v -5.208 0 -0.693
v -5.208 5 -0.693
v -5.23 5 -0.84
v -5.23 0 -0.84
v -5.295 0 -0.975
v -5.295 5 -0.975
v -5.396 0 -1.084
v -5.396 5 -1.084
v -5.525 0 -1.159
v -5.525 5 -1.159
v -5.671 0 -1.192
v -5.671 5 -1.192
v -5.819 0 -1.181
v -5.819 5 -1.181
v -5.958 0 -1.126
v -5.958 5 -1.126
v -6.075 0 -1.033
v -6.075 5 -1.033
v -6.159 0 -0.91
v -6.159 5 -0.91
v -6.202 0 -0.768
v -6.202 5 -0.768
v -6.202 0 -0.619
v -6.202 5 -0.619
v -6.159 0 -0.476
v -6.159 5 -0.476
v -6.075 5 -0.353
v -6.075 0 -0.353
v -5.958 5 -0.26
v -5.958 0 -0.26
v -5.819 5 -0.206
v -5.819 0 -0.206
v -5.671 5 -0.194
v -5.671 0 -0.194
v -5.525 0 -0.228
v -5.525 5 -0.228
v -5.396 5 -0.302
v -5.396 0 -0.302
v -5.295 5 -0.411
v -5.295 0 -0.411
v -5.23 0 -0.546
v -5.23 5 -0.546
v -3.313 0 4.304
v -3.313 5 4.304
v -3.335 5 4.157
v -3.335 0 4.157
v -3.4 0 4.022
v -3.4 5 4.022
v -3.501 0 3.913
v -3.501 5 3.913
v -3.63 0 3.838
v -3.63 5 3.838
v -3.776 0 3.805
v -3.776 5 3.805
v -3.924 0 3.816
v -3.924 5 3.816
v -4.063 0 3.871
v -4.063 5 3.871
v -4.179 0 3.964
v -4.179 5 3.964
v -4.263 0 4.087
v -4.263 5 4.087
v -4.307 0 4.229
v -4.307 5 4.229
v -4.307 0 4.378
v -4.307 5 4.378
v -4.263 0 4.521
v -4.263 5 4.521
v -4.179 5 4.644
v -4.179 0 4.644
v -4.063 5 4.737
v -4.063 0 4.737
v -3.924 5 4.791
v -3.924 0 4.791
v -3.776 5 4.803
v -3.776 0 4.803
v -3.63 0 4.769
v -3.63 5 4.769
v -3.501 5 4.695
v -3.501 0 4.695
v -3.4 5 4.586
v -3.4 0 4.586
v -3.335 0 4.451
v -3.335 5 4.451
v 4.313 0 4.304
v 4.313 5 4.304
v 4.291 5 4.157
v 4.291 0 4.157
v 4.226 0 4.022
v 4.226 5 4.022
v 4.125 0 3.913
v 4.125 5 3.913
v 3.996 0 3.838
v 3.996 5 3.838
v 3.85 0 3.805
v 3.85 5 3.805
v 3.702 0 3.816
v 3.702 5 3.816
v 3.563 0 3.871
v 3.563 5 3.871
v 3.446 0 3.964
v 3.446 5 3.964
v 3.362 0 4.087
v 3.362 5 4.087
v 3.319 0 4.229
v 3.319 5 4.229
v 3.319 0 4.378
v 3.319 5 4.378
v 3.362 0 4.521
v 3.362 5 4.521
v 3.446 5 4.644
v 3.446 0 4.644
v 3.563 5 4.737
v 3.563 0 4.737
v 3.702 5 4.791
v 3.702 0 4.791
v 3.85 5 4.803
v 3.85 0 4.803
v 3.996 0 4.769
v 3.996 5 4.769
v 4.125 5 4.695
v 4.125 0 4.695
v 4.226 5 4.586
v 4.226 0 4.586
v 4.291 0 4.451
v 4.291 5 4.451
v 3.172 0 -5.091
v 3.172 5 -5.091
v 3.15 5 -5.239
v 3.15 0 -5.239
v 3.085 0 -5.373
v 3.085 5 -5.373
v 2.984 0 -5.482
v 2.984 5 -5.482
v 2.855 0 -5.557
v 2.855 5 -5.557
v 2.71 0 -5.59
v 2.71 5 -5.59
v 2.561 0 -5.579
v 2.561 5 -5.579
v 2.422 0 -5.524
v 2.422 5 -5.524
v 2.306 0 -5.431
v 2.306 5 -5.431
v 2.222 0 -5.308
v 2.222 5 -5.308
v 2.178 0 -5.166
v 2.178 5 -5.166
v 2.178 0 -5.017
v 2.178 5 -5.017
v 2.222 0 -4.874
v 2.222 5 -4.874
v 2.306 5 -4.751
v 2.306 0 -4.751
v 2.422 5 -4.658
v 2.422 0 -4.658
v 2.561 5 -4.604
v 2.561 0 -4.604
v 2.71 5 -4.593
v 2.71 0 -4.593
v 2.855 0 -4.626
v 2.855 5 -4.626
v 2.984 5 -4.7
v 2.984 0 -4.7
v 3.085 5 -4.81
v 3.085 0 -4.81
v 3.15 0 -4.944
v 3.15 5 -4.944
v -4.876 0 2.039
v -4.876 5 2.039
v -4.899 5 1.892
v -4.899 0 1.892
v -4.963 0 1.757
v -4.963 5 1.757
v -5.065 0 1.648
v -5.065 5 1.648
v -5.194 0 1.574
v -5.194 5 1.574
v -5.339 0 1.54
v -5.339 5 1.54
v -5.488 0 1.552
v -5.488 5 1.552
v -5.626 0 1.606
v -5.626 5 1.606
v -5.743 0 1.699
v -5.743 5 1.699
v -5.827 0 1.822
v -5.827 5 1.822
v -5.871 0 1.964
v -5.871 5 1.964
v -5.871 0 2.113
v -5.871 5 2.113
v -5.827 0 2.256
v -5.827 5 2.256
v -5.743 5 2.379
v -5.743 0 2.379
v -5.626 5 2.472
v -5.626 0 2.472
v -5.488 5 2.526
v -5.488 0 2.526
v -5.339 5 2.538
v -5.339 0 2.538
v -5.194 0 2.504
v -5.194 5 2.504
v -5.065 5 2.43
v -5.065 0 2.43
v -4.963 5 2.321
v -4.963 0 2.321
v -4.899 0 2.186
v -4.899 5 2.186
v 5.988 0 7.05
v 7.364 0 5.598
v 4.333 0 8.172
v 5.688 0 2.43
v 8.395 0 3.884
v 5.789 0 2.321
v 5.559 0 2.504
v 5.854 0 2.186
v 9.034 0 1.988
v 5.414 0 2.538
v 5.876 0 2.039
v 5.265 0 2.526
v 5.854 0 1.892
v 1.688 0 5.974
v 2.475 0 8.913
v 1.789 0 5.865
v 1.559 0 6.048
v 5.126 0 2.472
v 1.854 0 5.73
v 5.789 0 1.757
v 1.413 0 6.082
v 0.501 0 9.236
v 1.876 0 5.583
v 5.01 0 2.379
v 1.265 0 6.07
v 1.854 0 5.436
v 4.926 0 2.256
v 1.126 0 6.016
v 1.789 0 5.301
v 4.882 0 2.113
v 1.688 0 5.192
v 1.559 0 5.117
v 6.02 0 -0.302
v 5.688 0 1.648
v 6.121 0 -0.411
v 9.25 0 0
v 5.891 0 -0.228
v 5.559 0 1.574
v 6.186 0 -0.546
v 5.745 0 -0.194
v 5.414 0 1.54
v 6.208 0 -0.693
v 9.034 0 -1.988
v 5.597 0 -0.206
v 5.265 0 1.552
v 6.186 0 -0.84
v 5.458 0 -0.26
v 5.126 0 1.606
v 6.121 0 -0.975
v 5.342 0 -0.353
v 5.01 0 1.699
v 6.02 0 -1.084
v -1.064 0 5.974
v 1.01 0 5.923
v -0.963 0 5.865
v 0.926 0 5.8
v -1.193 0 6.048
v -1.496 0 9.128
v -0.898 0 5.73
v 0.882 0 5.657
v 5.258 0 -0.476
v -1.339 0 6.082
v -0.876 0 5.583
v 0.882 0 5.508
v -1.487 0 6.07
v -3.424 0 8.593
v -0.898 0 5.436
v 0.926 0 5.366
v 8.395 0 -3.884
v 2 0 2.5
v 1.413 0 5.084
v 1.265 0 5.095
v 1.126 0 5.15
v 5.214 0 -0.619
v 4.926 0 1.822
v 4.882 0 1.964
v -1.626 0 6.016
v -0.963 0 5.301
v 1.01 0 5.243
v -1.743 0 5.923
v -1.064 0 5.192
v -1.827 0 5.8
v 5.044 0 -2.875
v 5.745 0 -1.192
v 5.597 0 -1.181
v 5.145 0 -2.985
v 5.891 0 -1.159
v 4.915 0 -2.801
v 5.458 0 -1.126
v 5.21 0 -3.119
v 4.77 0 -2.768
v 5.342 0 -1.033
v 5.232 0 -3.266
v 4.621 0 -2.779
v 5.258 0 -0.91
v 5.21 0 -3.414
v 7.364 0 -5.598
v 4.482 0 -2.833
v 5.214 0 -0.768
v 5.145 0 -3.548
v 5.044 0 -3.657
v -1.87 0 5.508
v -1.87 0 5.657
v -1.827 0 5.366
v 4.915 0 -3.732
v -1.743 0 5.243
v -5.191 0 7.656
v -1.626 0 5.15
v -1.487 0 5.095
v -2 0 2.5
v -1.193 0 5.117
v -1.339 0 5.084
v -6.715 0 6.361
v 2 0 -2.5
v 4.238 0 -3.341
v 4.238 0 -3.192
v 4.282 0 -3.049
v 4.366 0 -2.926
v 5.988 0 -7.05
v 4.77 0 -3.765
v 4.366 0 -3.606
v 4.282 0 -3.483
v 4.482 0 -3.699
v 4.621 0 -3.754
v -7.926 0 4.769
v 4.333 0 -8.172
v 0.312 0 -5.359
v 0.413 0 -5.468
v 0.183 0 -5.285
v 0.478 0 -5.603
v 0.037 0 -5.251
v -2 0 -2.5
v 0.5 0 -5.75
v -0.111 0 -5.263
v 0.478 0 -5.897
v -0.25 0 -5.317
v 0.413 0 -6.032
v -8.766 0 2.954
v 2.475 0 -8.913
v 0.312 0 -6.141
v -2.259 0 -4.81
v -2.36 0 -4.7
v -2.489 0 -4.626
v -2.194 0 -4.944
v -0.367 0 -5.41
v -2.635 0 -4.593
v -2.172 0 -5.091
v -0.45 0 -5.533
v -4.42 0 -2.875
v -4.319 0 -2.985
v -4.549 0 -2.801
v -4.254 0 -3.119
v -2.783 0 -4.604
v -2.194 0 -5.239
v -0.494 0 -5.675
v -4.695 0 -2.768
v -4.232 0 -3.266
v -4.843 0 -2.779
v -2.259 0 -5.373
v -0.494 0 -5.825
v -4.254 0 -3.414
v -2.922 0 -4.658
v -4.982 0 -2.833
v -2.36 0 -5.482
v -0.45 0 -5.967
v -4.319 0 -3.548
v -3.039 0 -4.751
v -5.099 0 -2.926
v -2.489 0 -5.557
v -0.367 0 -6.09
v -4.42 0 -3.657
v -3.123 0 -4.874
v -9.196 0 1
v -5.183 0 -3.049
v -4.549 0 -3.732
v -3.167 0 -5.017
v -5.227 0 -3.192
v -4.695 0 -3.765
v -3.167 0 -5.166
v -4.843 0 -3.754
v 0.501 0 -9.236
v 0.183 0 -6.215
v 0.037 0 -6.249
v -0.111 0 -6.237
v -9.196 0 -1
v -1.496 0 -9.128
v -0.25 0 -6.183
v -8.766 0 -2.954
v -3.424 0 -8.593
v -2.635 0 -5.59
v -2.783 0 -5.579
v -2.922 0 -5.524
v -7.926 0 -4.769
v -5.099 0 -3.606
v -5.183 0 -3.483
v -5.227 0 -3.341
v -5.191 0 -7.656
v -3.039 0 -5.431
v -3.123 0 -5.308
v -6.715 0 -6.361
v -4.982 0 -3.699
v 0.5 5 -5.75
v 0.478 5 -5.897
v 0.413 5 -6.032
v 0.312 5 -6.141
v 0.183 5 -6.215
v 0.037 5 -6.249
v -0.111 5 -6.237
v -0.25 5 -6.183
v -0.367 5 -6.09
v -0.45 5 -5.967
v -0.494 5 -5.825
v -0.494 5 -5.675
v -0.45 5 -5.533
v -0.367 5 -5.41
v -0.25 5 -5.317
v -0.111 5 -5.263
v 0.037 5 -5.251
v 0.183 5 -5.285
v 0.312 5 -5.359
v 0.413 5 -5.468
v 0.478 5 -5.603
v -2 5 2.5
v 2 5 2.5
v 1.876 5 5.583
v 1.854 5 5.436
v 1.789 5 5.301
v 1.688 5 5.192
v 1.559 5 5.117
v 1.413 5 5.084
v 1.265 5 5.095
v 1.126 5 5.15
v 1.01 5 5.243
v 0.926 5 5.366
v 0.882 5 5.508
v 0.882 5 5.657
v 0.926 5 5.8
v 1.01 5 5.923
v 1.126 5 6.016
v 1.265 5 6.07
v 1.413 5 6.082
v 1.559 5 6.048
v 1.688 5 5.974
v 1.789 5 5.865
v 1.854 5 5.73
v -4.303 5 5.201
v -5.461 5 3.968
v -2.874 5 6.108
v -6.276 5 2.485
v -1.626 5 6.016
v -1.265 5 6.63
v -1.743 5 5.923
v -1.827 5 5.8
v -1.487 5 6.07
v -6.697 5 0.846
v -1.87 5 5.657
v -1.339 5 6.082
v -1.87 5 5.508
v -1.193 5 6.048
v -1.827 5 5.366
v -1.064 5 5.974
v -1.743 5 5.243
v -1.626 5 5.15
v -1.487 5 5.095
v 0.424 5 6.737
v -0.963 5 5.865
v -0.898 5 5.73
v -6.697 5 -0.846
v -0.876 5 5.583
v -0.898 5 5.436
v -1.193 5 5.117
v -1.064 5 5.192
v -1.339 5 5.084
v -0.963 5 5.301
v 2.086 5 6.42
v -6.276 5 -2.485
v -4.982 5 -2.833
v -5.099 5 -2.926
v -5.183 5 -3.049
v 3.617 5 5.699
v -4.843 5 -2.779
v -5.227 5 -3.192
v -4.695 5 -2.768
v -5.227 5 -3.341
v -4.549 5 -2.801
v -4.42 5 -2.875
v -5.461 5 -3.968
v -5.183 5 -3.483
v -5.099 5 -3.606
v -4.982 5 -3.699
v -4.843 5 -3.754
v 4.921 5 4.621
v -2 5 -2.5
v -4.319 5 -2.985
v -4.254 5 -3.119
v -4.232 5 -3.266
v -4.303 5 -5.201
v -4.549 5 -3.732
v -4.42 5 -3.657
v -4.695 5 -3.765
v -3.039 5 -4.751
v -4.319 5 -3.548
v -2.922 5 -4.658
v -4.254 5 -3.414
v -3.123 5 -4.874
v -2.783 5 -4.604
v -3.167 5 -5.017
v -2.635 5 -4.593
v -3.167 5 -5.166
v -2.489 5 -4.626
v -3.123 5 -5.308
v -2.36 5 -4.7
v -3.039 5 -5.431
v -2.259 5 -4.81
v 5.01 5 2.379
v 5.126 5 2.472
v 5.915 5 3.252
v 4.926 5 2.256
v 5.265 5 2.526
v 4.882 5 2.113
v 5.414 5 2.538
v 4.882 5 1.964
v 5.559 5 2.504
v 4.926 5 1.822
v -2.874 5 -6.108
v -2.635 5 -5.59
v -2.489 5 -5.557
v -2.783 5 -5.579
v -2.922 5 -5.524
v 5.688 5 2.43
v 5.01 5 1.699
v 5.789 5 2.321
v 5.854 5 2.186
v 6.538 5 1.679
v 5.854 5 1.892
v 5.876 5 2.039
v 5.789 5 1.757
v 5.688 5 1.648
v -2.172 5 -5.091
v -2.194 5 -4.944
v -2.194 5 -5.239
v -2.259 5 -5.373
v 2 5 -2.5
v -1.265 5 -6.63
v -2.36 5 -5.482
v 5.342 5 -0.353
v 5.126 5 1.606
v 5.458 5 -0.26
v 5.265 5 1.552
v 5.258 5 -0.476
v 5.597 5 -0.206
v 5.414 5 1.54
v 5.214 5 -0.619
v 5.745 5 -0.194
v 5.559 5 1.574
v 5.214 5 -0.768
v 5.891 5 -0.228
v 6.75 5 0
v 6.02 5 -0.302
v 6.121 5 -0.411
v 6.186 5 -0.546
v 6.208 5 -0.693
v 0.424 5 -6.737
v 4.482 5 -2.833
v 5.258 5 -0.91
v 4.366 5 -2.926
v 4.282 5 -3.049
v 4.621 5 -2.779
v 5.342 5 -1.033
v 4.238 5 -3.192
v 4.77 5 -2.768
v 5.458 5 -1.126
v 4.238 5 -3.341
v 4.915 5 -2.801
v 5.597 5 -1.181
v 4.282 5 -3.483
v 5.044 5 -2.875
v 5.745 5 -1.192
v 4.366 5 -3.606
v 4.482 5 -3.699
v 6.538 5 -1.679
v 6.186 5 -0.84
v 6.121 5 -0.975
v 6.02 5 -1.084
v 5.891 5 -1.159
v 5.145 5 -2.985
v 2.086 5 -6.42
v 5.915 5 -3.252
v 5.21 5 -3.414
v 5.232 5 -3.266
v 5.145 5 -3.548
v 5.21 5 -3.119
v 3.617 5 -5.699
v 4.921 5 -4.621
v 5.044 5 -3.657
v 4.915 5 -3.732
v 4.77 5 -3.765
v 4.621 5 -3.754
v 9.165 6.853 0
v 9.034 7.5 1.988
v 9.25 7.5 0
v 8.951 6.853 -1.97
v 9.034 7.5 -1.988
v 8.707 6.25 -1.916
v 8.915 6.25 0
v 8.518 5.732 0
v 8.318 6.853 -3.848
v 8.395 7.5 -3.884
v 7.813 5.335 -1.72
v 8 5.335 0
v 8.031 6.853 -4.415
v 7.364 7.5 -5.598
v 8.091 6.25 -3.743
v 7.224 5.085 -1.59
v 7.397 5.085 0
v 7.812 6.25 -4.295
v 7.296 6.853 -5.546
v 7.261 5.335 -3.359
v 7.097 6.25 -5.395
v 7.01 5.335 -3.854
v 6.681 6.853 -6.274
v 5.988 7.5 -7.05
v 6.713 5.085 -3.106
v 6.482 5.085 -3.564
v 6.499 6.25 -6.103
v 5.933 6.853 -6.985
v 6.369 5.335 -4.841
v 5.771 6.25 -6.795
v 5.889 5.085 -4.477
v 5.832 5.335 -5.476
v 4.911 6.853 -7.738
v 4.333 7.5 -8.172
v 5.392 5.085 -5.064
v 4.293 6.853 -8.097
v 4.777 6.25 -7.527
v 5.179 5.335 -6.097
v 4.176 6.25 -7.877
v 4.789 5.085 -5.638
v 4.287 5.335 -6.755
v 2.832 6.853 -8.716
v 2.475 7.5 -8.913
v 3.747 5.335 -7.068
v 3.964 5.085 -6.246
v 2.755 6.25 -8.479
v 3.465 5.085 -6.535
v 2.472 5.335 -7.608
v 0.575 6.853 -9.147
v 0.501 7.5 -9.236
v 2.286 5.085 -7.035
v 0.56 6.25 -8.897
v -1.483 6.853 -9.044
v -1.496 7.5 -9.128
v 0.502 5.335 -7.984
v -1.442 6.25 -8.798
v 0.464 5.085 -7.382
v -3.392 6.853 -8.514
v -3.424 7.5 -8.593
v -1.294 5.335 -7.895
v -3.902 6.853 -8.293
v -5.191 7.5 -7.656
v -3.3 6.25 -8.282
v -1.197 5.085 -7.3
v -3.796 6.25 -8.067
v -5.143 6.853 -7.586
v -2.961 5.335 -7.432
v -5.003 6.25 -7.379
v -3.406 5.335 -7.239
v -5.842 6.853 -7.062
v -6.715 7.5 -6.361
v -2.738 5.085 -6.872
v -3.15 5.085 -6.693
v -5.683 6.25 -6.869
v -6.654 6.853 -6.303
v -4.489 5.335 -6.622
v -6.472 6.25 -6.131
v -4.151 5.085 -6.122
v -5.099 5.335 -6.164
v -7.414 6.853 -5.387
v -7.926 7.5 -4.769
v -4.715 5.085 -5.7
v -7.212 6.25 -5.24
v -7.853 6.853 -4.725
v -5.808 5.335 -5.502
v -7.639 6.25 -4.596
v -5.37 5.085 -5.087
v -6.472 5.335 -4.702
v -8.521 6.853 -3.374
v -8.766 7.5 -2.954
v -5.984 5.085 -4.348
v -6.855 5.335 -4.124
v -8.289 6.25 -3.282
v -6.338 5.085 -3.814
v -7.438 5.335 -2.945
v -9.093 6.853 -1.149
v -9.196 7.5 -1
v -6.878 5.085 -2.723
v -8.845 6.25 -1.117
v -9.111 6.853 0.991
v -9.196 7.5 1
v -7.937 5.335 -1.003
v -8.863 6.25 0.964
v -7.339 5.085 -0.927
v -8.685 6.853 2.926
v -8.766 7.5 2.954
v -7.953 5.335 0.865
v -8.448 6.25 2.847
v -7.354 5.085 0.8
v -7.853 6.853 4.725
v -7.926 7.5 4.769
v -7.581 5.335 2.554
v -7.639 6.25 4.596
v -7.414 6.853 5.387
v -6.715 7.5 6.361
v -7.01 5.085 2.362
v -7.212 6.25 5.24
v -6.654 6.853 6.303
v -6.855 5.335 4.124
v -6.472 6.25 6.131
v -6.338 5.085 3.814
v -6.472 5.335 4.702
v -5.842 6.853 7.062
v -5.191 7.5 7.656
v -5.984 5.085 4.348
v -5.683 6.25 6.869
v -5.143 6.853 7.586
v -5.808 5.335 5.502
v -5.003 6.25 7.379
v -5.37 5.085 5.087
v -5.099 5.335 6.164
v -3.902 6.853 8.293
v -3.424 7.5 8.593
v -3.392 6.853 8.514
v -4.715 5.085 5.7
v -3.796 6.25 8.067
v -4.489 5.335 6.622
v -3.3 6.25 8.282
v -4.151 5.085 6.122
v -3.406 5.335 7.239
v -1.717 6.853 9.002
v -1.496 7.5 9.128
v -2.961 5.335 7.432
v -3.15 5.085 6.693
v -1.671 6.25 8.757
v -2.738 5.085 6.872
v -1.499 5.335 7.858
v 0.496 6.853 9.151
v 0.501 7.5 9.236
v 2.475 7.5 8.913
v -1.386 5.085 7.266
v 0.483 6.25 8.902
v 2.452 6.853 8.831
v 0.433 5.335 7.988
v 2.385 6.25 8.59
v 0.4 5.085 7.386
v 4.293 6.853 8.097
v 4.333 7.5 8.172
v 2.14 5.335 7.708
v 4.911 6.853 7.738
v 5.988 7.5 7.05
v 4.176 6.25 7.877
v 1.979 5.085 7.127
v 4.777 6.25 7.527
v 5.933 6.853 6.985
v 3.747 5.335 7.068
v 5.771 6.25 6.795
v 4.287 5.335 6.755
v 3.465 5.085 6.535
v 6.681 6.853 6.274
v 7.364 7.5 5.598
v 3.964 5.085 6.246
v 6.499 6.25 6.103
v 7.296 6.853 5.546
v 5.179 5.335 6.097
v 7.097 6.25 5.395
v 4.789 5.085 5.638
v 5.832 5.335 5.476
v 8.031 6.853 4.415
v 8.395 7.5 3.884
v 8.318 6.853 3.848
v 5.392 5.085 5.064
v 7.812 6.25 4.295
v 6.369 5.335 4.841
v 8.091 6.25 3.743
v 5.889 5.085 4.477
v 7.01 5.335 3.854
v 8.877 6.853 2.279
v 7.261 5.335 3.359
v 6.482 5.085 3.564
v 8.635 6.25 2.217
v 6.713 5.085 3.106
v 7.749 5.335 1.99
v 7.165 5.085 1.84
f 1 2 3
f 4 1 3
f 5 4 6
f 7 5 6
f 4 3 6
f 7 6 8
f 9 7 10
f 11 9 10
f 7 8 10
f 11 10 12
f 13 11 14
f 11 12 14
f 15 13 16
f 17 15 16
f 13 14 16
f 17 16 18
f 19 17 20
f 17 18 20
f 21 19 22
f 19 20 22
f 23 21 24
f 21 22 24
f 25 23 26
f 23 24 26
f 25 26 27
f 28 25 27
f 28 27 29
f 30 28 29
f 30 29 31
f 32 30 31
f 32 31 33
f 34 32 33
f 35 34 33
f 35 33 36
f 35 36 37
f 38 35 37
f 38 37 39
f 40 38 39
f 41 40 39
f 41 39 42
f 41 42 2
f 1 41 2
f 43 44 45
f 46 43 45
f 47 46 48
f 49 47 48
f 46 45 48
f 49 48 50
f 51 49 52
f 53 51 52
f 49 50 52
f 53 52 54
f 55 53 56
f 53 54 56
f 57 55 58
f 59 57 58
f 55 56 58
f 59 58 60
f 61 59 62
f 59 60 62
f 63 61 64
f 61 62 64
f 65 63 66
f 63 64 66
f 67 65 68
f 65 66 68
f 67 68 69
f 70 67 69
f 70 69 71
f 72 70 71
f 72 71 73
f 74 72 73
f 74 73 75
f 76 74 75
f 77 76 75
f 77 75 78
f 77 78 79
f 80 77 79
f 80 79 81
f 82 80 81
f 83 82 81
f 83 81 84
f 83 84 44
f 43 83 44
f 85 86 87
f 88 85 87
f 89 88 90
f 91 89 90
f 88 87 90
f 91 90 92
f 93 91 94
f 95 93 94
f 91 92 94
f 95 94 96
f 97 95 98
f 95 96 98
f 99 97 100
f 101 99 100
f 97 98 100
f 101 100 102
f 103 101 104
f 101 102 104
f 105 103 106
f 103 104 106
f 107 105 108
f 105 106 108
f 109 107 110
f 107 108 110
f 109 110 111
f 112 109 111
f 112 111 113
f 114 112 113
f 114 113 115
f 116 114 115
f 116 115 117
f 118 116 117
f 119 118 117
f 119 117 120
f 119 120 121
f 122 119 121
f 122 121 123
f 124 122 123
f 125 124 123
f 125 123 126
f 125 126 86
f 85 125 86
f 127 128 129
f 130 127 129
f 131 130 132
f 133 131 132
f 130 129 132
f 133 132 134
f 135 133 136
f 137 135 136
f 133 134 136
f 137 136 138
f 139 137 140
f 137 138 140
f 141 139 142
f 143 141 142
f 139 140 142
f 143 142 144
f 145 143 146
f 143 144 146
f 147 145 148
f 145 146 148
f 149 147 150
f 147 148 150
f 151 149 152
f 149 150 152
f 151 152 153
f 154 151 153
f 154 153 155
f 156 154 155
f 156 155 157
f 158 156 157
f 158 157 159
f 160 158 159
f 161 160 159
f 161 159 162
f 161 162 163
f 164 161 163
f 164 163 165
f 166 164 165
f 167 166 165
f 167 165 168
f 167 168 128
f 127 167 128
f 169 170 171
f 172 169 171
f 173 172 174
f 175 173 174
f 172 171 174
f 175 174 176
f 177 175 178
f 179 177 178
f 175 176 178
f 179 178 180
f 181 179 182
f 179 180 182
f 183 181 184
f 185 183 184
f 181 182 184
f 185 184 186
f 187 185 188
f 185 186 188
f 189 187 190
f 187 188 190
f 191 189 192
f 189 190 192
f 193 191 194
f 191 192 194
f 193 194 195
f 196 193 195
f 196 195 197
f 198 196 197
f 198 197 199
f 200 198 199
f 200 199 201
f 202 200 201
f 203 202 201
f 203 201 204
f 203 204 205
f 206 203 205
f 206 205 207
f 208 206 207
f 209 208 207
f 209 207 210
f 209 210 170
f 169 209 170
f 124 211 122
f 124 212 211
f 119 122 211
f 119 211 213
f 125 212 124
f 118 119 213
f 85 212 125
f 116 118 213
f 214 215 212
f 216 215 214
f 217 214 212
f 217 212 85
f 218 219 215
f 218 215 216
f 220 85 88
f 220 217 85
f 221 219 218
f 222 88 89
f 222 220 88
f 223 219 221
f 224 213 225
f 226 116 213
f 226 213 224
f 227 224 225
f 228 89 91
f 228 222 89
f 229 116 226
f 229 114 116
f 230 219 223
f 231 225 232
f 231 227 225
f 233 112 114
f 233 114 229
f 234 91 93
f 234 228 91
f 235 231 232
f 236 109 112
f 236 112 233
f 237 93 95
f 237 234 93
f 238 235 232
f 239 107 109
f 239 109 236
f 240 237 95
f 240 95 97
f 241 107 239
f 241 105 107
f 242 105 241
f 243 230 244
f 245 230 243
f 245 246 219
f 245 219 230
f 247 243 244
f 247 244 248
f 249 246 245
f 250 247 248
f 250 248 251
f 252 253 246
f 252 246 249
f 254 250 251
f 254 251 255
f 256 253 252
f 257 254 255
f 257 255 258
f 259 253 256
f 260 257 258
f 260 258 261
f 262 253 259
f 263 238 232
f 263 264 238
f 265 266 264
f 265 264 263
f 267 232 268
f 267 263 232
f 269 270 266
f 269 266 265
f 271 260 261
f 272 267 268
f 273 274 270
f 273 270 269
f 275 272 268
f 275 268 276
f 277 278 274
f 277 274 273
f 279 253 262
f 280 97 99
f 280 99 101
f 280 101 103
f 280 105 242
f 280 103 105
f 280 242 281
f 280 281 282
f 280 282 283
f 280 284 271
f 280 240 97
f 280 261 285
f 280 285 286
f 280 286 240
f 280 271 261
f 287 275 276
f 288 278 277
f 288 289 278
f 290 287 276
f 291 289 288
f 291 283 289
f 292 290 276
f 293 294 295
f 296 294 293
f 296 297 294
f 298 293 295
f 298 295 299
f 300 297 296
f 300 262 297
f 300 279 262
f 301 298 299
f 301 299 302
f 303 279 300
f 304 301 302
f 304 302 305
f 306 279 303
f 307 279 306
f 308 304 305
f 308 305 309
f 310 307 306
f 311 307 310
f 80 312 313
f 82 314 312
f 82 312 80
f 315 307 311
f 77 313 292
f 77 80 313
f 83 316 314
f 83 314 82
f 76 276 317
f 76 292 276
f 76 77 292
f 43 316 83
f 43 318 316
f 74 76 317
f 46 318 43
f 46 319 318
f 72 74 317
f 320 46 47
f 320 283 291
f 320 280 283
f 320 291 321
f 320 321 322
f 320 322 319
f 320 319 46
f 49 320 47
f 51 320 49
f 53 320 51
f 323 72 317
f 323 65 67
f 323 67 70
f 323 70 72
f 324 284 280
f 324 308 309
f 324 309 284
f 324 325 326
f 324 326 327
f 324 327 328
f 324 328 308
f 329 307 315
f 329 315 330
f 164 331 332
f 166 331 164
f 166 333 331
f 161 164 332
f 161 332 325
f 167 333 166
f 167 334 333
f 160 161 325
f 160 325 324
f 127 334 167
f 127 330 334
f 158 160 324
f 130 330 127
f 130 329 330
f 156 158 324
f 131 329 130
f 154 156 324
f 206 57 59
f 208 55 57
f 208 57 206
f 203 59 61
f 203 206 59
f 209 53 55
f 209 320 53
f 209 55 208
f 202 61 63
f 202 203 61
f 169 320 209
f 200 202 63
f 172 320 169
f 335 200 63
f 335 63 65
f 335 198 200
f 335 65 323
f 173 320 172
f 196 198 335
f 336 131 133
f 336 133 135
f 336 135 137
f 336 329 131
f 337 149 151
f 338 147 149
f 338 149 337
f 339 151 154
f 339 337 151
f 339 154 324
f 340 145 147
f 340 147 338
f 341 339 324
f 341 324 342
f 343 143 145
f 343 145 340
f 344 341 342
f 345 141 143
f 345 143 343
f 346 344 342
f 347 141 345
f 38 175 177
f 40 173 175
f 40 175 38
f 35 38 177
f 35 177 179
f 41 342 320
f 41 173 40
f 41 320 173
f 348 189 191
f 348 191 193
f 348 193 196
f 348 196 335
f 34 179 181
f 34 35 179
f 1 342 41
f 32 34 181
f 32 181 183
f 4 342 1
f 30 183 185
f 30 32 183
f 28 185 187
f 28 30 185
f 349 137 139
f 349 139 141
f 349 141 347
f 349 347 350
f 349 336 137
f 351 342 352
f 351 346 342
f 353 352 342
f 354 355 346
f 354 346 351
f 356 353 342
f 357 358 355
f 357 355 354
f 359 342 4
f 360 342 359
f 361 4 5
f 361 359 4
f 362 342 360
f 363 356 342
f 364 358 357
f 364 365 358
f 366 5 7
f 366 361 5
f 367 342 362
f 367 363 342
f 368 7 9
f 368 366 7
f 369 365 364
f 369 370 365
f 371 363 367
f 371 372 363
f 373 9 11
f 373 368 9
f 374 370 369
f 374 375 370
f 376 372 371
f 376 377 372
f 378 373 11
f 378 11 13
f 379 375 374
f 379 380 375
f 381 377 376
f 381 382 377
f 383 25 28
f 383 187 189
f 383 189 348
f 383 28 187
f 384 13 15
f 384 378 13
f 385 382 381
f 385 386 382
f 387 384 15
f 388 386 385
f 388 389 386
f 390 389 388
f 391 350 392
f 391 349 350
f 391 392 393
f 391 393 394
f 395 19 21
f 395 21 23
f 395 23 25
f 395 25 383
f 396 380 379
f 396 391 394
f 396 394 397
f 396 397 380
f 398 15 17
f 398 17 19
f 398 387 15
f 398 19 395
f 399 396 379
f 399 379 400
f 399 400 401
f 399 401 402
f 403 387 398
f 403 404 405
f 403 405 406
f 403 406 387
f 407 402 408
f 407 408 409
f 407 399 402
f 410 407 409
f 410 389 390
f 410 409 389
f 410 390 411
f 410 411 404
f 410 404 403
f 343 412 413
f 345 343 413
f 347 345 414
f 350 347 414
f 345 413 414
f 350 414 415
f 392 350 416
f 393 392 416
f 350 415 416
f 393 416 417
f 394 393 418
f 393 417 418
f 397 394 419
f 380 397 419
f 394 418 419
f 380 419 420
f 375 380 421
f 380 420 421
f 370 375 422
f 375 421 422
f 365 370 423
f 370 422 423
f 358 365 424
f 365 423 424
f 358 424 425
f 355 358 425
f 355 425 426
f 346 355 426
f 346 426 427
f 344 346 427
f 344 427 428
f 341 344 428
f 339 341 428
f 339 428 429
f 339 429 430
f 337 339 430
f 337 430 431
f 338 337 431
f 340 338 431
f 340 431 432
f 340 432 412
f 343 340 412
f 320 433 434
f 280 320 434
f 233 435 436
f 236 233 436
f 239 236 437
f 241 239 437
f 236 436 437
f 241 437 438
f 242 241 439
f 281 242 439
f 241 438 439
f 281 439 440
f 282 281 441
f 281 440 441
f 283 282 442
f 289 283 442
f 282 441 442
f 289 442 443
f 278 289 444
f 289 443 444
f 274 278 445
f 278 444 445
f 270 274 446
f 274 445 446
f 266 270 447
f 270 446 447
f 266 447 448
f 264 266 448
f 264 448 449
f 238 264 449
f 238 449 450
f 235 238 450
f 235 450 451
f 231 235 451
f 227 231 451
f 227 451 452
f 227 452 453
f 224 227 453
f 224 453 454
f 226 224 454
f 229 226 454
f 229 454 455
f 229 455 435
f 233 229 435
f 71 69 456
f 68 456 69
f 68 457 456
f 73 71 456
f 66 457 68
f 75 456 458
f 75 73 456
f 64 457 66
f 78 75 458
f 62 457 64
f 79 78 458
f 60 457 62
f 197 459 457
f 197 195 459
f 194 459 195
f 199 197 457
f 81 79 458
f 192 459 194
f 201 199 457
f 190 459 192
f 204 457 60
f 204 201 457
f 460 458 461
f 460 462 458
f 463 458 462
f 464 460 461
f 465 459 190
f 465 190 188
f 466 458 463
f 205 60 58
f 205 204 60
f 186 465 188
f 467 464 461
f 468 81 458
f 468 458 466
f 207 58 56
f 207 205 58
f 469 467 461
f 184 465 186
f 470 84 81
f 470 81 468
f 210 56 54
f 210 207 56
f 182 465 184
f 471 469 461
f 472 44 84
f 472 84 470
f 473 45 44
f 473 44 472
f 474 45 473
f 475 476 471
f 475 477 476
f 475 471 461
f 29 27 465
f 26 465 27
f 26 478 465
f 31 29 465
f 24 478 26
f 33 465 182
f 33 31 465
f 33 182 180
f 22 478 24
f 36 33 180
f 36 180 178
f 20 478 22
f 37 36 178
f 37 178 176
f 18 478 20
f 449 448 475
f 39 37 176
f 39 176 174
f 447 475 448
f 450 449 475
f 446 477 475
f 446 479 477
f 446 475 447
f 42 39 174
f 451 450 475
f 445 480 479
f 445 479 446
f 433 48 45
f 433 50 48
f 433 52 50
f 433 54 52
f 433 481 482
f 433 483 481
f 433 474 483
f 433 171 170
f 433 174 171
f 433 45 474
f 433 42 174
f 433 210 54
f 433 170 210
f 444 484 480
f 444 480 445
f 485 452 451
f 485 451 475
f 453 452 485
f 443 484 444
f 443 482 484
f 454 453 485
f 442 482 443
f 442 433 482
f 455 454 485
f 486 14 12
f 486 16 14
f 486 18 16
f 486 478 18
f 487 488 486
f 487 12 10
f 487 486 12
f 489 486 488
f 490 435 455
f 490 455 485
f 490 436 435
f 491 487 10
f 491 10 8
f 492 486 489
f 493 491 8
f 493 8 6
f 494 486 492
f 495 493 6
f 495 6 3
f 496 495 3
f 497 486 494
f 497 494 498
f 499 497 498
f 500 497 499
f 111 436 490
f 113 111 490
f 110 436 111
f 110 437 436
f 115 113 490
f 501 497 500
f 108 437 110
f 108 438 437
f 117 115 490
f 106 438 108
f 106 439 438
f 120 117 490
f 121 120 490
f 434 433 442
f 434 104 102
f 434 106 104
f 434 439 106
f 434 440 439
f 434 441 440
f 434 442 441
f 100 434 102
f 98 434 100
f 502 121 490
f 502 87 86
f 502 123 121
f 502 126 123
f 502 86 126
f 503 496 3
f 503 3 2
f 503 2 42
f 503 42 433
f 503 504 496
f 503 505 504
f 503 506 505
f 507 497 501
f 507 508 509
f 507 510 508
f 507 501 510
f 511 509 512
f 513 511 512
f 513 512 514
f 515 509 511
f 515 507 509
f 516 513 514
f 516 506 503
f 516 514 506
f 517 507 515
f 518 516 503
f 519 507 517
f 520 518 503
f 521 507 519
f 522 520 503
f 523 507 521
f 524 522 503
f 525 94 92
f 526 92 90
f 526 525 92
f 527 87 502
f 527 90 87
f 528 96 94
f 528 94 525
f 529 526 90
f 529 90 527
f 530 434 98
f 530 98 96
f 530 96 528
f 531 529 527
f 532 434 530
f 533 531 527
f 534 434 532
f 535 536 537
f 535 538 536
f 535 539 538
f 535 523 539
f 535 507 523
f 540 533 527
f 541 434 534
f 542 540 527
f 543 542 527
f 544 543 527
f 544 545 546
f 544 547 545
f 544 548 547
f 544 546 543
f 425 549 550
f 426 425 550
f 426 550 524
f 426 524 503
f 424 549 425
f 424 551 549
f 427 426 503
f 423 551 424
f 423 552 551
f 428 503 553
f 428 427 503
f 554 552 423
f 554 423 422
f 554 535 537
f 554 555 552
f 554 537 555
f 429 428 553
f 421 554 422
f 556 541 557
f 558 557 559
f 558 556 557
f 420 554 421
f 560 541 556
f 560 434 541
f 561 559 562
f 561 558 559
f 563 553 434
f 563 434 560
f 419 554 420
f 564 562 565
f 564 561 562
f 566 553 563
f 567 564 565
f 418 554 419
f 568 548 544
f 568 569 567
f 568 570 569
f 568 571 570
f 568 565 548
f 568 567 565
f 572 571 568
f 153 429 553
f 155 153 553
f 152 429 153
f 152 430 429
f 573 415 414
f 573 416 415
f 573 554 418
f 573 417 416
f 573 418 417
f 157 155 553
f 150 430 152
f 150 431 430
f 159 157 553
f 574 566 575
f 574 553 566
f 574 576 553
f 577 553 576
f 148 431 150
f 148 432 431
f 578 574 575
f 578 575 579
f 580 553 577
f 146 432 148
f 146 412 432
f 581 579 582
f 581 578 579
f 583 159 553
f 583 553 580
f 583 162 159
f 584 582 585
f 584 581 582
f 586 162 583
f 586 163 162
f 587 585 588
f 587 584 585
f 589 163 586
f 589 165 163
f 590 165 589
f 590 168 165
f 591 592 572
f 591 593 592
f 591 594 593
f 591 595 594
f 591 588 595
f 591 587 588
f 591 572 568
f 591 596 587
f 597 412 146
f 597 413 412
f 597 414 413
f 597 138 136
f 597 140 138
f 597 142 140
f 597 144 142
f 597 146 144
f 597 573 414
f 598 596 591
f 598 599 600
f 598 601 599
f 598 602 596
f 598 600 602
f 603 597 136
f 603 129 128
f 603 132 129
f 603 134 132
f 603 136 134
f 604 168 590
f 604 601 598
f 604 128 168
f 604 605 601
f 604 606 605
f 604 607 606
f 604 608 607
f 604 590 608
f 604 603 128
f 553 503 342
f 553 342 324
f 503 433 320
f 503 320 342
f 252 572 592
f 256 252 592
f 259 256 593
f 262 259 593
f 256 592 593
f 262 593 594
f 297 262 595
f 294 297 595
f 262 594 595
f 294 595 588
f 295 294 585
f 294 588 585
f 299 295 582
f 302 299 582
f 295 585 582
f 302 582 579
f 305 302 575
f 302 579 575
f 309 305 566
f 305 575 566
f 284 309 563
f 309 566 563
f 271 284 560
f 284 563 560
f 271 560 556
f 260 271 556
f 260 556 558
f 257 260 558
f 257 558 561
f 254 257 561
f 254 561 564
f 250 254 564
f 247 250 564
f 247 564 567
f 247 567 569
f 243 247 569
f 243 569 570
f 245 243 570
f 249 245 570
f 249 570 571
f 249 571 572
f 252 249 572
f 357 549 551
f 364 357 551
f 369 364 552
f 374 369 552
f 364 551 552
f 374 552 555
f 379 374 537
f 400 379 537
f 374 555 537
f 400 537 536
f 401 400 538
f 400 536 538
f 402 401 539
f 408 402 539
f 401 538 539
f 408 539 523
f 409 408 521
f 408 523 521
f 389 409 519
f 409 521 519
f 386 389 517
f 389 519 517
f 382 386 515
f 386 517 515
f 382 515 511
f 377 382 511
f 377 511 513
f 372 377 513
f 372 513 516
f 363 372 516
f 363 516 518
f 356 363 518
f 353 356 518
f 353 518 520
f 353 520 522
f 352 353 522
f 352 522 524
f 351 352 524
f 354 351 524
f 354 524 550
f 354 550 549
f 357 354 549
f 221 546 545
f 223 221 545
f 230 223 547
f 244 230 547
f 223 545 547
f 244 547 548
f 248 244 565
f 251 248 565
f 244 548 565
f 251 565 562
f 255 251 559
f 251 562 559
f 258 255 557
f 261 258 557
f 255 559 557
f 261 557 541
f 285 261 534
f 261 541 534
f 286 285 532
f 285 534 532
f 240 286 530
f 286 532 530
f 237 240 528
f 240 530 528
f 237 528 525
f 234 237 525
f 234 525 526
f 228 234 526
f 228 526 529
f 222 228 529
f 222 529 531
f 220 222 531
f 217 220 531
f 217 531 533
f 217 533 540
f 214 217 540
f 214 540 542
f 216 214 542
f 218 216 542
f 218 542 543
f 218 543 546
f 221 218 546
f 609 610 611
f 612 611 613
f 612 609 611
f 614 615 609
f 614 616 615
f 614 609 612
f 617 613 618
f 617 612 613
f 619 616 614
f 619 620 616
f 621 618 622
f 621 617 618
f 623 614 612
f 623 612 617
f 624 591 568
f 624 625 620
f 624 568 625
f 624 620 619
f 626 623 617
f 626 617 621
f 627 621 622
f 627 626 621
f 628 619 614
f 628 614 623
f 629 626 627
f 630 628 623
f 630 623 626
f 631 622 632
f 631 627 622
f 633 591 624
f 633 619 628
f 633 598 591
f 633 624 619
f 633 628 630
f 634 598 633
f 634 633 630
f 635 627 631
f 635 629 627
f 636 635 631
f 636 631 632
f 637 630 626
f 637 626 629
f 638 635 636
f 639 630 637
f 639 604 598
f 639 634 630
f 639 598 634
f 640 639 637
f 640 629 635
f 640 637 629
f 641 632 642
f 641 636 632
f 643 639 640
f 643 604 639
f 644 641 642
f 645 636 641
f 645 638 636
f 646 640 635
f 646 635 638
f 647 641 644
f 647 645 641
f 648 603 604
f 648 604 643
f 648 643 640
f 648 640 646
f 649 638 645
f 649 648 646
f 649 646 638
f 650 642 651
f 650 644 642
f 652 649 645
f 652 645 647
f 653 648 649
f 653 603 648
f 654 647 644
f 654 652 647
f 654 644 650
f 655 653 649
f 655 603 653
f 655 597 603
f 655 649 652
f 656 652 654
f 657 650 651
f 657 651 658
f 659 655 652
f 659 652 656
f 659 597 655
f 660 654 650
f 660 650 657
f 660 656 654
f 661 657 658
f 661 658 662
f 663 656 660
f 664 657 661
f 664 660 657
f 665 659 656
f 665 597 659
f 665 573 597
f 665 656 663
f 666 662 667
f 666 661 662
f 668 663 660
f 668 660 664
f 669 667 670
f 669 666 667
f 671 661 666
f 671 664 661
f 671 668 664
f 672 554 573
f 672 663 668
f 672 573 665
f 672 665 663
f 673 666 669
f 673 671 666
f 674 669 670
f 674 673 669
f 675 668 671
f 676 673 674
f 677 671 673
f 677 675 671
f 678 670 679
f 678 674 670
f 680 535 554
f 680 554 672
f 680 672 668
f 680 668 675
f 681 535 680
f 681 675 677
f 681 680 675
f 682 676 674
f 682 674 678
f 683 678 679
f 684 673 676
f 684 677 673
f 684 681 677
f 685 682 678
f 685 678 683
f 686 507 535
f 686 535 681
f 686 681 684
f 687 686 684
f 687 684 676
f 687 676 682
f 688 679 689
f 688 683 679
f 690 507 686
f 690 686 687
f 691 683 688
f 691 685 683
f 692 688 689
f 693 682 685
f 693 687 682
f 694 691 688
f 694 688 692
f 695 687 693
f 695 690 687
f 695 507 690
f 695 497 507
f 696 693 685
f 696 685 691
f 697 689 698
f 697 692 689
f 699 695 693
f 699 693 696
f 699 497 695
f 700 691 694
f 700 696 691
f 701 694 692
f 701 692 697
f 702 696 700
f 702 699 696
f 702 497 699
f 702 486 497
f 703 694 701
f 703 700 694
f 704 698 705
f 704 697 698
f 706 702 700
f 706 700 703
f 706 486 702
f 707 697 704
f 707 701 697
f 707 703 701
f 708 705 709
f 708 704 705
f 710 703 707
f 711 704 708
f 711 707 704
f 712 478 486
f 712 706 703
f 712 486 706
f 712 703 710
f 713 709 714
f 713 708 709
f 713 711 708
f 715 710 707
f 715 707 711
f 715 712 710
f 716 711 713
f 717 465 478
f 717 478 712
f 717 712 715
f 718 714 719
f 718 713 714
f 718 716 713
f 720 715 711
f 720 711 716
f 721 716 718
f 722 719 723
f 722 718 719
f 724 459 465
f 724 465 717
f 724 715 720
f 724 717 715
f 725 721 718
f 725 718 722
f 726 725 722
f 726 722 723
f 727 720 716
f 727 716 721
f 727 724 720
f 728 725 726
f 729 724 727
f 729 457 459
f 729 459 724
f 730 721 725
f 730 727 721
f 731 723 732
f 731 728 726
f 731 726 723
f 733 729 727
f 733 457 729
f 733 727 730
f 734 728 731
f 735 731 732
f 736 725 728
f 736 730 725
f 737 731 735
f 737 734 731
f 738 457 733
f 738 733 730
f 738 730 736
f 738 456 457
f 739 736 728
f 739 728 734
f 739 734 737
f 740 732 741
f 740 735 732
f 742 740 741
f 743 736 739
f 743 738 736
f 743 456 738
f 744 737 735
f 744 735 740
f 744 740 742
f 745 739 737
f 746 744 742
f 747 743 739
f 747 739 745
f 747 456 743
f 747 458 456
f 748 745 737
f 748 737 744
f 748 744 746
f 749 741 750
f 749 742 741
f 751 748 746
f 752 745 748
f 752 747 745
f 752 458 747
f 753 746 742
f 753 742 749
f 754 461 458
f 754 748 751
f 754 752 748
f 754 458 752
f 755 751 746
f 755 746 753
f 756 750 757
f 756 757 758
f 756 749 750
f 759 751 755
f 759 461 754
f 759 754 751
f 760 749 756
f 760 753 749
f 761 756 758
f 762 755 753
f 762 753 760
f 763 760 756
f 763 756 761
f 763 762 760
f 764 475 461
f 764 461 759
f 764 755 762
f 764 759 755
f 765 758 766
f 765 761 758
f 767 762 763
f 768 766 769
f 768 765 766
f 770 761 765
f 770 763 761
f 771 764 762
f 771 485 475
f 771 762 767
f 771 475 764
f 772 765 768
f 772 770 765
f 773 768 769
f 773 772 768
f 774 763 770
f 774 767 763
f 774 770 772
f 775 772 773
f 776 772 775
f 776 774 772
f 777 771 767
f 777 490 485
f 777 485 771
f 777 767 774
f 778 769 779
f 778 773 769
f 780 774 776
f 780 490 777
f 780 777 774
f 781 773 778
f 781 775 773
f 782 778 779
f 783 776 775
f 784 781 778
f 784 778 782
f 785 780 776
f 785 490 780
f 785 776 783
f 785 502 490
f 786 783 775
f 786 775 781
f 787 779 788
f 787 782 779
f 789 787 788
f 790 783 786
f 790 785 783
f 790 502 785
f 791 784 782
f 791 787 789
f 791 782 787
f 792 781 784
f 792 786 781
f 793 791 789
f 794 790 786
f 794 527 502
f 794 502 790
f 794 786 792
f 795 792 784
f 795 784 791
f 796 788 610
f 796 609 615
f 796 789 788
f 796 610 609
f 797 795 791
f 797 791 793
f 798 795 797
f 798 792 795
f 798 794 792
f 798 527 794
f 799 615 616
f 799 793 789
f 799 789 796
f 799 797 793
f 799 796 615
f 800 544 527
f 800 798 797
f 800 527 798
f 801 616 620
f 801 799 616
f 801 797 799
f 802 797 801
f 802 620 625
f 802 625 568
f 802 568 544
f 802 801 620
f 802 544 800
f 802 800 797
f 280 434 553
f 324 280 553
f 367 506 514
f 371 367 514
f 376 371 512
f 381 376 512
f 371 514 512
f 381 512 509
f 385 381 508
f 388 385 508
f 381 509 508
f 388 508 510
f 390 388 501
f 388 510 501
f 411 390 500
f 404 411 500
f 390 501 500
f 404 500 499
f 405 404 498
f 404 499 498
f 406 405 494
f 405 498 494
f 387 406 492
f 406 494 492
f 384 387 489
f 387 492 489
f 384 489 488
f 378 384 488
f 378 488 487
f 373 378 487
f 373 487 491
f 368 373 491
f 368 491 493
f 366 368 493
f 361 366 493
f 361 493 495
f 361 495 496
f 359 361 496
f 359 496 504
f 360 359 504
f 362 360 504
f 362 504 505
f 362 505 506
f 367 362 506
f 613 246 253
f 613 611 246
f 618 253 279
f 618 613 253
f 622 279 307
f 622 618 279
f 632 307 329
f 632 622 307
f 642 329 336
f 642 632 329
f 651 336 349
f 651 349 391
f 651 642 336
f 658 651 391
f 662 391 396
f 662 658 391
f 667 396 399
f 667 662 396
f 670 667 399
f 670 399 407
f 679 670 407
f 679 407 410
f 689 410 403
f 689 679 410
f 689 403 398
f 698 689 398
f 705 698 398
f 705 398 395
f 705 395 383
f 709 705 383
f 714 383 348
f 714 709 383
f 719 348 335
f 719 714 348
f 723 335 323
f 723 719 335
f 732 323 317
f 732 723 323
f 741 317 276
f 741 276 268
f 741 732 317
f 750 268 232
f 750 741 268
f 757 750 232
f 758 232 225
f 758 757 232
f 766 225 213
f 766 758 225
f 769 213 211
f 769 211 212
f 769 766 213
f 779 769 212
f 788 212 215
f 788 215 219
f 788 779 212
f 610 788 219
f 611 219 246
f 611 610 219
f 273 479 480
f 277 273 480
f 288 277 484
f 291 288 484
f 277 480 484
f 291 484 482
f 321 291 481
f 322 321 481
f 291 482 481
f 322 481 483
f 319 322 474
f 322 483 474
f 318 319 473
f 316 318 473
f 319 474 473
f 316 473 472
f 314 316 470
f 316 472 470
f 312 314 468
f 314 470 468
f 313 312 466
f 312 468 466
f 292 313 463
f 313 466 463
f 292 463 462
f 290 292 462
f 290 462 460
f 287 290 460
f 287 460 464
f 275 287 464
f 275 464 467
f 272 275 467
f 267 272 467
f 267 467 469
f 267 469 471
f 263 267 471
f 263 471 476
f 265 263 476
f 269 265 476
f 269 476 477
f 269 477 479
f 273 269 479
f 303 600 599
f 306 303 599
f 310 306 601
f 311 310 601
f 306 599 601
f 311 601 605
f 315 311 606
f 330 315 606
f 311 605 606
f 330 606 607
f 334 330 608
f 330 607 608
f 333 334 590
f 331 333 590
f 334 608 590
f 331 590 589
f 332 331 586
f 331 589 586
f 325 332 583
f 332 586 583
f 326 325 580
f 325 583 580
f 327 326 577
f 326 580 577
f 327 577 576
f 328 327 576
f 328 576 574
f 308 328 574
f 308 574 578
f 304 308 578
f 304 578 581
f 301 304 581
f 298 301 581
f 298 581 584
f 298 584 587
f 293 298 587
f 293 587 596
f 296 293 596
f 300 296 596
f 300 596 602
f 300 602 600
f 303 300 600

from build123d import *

# Parameters (mm, degrees)
CROQUIS2_R            = 0.5
CROQUIS2_W            = 4
CROQUIS2_H            = 5
CORTAR_EXTRUIR1_DEPTH = 6


with BuildPart() as part:
    # Croquis1 → Revolución1 (revolve)
    with BuildSketch(Plane.XY):
        with BuildLine():
            ThreePointArc((9.25, 7.5), (8.517766953, 5.732233047), (6.75, 5))
            Line((6.75, 5), (0, 5))
            Line((0, 5), (0, 0))
            Line((0, 0), (9.25, 0))
            Line((9.25, 0), (9.25, 7.5))
        make_face()
    revolve(axis=Axis((0, 0, 0), (0, 1, 0)))

    # Croquis2 → Cortar-Extruir1 (cut, through all)
    with BuildSketch(Plane(origin=(0, 5, 0), x_dir=(1, 0, 0), z_dir=(0, 1, 0))):
        with Locations((0, 5.75)):
            Circle(CROQUIS2_R)
        with Locations((2.672158239, 5.091372148)):
            Circle(CROQUIS2_R)
        with Locations((4.732157229, 3.266372294)):
            Circle(CROQUIS2_R)
        with Locations((5.708076026, 0.693085911)):
            Circle(CROQUIS2_R)
        with Locations((5.376343395, -2.0389781)):
            Circle(CROQUIS2_R)
        with Locations((3.812955285, -4.303936802)):
            Circle(CROQUIS2_R)
        with Locations((1.37606507, -5.58291545)):
            Circle(CROQUIS2_R)
        with Locations((-1.37606507, -5.58291545)):
            Circle(CROQUIS2_R)
        with Locations((-3.812955285, -4.303936802)):
            Circle(CROQUIS2_R)
        with Locations((-5.376343395, -2.0389781)):
            Circle(CROQUIS2_R)
        with Locations((-5.708076026, 0.693085911)):
            Circle(CROQUIS2_R)
        with Locations((-4.732157229, 3.266372294)):
            Circle(CROQUIS2_R)
        with Locations((-2.672158239, 5.091372148)):
            Circle(CROQUIS2_R)
        Rectangle(CROQUIS2_W, CROQUIS2_H)
    extrude(amount=-CORTAR_EXTRUIR1_DEPTH, mode=Mode.SUBTRACT)


solid = part.part
